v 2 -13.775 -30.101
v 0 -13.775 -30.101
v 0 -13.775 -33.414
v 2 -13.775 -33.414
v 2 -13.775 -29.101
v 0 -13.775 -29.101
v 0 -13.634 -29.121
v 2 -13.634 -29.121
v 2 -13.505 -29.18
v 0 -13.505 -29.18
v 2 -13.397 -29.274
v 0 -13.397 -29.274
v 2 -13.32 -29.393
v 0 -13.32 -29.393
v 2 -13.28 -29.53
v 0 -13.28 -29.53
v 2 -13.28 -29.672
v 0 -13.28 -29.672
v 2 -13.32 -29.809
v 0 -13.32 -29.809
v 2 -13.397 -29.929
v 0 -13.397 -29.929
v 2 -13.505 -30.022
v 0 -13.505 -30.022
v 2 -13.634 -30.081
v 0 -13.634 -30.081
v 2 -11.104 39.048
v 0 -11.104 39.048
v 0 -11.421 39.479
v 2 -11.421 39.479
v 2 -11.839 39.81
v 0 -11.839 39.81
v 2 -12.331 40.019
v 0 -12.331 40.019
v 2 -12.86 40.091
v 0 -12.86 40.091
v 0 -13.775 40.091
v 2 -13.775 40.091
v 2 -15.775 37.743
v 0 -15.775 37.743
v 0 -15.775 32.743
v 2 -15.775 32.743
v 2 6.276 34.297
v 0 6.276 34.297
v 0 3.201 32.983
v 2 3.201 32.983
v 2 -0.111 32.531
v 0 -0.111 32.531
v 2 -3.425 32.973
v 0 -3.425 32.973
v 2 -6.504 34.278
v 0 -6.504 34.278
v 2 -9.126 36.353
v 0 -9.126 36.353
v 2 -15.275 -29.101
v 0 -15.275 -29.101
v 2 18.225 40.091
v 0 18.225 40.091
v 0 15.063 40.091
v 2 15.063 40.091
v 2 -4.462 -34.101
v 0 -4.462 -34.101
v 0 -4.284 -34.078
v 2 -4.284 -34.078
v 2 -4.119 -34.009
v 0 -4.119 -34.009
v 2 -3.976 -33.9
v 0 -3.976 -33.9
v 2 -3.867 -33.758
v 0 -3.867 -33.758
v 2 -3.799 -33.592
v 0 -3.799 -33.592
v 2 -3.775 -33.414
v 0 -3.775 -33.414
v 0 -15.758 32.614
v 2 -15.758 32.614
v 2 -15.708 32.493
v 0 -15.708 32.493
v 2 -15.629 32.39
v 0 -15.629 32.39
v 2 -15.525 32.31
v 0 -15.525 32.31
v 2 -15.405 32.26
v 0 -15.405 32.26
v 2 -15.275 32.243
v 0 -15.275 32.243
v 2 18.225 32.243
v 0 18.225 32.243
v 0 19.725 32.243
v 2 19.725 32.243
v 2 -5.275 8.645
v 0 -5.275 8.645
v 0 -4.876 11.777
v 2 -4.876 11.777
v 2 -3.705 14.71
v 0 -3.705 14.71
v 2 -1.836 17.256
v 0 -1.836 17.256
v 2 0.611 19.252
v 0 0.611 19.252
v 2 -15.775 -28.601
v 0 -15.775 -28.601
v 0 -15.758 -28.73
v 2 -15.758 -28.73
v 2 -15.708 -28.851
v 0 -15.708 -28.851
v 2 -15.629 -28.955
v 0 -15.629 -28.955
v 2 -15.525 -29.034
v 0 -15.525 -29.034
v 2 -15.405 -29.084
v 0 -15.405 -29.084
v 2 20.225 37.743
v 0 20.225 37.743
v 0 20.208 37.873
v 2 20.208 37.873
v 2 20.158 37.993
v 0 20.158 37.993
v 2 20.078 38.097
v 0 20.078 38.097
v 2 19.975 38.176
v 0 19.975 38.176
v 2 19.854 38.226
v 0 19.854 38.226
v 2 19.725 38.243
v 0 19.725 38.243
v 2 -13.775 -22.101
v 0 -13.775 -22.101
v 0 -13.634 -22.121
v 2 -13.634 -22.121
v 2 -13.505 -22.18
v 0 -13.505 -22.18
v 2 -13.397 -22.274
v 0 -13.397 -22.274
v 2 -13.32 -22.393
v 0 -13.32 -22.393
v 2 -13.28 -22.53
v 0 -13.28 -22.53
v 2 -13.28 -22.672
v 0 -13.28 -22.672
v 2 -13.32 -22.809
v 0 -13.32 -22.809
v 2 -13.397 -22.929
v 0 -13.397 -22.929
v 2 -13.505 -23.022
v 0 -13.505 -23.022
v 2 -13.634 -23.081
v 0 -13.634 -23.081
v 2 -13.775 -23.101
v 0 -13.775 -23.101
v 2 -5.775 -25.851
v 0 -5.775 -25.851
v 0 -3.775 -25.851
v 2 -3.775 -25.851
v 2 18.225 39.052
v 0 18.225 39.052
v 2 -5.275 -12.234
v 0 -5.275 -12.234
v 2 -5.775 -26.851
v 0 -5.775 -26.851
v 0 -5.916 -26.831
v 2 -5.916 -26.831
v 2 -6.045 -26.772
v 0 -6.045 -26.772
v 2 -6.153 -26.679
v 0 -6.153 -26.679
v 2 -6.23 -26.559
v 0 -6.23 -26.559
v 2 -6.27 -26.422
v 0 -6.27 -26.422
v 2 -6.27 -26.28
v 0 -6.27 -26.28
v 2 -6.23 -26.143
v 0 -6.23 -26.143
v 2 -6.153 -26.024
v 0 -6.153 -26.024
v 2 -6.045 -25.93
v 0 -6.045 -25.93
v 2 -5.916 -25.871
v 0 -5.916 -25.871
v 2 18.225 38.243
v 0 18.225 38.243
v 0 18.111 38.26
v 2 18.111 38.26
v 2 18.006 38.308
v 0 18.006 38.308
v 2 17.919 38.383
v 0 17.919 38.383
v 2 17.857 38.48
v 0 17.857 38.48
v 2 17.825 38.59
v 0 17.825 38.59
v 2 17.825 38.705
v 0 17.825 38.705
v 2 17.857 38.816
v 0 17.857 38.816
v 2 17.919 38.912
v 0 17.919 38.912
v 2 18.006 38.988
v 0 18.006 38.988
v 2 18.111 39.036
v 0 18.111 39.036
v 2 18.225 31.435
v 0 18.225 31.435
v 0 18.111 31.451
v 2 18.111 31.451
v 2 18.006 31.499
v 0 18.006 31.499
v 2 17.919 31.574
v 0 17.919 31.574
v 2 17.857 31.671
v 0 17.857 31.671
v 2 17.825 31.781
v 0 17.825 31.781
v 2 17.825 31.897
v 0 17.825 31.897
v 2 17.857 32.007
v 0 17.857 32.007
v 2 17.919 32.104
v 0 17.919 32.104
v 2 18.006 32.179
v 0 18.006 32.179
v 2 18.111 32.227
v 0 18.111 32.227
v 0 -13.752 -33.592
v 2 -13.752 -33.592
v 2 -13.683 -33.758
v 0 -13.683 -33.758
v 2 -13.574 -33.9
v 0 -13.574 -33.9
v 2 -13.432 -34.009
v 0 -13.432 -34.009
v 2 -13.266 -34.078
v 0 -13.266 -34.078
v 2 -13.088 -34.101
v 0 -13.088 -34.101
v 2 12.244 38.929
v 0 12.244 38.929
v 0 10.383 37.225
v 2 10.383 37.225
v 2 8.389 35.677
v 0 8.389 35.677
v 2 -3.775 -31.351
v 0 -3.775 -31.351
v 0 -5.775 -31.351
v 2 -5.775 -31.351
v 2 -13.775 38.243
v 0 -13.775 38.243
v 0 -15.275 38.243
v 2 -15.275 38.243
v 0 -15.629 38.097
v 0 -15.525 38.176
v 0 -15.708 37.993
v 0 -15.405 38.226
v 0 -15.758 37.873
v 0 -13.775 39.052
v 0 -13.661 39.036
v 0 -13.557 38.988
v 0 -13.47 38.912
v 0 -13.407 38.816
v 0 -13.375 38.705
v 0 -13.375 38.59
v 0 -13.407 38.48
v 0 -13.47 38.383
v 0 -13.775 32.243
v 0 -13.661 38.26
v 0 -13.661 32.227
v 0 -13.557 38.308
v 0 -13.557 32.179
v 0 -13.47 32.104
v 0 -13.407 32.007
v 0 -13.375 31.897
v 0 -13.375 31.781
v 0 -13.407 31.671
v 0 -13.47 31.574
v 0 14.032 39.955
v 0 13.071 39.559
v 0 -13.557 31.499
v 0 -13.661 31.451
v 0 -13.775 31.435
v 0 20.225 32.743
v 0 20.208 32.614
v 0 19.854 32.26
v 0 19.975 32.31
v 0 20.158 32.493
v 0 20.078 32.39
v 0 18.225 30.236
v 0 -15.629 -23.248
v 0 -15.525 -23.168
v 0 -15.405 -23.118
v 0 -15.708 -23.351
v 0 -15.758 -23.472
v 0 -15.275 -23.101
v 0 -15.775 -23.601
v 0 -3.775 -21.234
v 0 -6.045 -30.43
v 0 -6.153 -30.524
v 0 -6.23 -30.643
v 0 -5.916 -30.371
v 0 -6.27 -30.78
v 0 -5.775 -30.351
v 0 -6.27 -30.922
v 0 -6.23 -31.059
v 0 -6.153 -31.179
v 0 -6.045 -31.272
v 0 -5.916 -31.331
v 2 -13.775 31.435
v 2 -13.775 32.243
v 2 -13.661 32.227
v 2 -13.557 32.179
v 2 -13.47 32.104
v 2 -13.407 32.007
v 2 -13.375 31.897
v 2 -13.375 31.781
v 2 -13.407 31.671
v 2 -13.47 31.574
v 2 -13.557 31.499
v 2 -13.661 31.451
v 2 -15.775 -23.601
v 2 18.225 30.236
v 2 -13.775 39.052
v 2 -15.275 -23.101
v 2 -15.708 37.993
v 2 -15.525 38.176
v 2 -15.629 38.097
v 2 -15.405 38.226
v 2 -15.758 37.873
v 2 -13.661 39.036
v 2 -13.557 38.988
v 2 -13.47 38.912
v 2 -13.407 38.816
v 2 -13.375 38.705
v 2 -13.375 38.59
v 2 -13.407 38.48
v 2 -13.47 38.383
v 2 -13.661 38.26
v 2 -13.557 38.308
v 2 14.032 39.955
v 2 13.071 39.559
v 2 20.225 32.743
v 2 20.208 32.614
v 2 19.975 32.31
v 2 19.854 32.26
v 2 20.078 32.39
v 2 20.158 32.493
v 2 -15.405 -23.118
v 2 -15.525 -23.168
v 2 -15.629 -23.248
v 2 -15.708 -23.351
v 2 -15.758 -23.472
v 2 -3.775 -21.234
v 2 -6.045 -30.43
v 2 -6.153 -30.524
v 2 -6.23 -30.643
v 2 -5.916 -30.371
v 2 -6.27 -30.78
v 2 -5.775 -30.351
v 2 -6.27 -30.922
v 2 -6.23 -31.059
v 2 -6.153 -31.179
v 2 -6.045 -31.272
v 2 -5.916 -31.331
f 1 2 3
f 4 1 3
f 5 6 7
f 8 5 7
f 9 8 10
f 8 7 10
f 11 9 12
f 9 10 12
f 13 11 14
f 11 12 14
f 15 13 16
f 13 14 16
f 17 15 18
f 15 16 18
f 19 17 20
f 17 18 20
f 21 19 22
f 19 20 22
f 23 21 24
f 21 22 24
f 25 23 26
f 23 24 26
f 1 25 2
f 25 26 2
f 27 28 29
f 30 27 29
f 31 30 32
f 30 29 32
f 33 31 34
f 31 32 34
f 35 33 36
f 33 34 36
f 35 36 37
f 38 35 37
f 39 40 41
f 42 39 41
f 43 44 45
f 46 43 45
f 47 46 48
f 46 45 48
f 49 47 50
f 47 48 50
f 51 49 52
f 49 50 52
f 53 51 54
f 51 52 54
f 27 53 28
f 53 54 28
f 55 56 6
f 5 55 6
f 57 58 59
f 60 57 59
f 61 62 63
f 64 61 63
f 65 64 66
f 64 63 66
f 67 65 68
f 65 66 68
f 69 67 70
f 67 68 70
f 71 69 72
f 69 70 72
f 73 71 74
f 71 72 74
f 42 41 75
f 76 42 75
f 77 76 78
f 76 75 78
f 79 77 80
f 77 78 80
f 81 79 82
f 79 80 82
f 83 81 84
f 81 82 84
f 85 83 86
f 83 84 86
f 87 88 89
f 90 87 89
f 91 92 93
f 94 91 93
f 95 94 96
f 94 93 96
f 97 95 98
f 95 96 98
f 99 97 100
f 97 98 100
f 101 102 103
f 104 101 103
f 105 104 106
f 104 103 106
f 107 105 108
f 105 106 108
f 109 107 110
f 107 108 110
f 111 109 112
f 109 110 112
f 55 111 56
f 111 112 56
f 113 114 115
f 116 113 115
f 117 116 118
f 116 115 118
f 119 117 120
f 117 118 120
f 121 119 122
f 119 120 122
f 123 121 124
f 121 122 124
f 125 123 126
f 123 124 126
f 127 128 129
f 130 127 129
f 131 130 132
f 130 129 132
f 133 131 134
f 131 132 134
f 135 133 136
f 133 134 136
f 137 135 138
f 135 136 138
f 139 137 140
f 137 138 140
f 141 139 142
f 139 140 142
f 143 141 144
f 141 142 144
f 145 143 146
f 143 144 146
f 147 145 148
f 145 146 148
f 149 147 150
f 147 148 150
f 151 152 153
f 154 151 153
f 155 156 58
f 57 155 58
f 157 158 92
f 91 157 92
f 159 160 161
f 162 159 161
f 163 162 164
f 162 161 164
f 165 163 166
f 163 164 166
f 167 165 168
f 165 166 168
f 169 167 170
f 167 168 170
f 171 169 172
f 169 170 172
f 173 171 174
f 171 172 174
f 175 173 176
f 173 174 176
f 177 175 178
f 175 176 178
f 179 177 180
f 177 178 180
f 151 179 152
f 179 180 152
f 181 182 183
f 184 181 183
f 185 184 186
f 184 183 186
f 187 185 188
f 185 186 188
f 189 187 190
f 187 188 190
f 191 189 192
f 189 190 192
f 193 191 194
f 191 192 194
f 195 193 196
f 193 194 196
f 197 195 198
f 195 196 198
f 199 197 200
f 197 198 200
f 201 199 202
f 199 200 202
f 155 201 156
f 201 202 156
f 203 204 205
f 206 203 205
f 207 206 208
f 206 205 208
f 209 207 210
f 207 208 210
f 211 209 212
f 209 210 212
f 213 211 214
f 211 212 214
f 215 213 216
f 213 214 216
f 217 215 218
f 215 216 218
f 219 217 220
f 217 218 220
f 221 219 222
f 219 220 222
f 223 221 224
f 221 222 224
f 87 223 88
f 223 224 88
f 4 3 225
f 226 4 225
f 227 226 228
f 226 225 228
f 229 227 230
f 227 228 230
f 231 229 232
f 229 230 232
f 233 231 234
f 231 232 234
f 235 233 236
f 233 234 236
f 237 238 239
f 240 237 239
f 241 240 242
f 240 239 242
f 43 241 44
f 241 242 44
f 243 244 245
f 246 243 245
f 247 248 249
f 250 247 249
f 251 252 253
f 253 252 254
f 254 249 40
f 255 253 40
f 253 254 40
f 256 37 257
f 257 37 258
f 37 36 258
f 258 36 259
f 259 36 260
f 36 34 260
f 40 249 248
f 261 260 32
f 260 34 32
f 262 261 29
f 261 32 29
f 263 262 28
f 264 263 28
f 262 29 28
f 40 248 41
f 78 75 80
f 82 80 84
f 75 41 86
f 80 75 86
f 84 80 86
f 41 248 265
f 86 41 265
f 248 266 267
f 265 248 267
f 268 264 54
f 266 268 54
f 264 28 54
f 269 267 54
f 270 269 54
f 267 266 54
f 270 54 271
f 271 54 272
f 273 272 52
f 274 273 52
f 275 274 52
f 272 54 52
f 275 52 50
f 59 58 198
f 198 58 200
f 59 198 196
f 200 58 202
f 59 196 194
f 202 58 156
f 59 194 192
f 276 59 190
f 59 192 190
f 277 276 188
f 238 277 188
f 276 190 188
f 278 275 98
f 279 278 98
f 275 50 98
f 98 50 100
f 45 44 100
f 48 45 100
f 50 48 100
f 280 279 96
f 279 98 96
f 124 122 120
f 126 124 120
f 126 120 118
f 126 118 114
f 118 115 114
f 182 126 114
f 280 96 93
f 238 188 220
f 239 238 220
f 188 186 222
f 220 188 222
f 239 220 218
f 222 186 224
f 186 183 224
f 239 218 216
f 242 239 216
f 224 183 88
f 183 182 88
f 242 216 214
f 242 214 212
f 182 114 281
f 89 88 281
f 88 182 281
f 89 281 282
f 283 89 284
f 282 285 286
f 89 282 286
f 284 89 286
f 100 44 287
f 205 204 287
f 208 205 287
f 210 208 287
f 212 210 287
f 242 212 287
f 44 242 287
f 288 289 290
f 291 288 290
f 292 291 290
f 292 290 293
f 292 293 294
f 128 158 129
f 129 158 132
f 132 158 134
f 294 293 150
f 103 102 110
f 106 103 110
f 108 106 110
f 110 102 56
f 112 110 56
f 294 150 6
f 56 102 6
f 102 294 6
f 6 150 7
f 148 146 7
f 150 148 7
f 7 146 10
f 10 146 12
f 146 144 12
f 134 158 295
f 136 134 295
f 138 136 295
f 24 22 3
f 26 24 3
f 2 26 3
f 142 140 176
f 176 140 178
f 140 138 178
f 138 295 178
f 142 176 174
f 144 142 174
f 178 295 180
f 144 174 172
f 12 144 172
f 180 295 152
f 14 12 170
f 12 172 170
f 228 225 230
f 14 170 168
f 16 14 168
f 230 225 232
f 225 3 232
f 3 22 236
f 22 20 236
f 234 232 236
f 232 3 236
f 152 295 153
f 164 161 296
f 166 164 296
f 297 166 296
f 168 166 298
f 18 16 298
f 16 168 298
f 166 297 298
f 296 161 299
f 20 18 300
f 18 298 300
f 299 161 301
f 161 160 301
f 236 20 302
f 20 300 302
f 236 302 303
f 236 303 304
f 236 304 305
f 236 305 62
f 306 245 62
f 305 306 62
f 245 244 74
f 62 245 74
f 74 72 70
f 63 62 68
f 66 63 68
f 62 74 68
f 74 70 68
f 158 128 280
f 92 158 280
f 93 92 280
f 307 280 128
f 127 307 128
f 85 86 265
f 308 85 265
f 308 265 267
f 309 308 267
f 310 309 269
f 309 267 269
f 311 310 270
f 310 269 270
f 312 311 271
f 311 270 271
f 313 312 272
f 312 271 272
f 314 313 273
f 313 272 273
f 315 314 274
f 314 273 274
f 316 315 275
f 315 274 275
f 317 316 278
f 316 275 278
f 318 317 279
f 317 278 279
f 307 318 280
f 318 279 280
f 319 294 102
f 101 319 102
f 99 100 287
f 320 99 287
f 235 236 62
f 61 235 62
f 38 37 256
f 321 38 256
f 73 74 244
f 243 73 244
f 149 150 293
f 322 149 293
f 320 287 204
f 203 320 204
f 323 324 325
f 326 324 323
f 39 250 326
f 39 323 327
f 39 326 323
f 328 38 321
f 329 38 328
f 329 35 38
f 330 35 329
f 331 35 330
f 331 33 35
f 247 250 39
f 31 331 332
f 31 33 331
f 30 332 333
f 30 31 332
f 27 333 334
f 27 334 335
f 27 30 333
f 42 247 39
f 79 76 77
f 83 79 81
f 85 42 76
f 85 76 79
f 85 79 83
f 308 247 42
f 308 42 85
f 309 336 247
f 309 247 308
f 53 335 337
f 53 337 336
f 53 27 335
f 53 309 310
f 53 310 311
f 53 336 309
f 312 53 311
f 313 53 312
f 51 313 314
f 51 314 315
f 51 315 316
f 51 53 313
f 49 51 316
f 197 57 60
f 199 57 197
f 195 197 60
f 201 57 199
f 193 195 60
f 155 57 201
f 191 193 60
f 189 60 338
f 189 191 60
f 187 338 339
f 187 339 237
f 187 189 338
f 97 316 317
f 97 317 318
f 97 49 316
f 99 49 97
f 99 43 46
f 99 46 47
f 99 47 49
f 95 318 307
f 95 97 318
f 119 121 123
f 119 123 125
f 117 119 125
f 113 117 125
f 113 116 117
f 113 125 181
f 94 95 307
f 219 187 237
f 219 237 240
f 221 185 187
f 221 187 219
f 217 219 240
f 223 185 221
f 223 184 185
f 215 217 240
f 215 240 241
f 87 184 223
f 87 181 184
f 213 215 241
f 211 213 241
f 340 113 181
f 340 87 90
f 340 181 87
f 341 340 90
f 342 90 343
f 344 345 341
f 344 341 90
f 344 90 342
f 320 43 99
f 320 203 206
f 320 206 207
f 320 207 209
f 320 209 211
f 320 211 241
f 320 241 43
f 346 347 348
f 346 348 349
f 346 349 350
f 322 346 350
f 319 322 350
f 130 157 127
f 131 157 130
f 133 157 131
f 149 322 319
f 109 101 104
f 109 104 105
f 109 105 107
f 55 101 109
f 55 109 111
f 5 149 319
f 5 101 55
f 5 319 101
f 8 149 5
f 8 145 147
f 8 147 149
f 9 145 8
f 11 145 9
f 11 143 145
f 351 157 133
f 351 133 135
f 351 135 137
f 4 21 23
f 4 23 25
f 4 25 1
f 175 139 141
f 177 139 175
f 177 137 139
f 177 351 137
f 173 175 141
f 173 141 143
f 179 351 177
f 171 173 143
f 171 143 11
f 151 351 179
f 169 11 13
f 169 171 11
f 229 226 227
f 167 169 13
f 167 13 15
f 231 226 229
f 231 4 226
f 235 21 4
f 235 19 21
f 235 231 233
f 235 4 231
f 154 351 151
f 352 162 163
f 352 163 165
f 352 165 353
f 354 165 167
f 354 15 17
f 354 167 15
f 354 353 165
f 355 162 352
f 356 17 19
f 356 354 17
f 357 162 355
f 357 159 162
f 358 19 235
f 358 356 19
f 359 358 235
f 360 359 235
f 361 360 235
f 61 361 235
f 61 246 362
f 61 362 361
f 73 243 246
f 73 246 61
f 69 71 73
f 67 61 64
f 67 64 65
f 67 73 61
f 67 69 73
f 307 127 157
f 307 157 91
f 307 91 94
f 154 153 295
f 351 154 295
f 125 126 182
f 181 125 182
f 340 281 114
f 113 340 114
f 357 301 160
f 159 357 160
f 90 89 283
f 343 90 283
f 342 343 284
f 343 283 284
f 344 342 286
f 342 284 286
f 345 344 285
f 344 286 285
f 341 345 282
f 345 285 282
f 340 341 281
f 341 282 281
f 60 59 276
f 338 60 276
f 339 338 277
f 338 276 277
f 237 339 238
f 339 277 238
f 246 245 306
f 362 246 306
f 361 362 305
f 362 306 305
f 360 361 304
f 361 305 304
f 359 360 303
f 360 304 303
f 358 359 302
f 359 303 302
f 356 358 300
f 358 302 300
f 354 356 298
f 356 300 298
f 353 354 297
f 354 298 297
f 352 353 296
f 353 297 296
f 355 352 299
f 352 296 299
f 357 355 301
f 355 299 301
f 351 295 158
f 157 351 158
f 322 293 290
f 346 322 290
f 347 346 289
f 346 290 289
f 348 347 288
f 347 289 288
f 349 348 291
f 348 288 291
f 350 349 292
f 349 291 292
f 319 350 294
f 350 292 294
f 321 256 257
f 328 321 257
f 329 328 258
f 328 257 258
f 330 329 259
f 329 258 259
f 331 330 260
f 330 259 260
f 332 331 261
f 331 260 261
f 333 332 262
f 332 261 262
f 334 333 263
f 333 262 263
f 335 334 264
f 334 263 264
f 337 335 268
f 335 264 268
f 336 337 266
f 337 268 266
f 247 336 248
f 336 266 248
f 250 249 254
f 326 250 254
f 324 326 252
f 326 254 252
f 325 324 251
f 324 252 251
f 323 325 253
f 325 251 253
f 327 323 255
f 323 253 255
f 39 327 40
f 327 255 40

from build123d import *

# Parameters (mm, degrees)
BOSS_EXTRUDE1_DEPTH = 2


with BuildPart() as part:
    # Sketch4 → Boss-Extrude1 (new body)
    with BuildSketch(Plane(origin=(0, 0, 0), x_dir=(0, 0, -1), z_dir=(1, 0, 0))):
        with BuildLine():
            Line((34.101087746, -13.088045862), (34.101087746, -4.462231487))
            ThreePointArc((34.101087746, -4.462231487), (33.899842921, -3.9763835), (33.413994934, -3.775138674))
            Line((33.413994934, -3.775138674), (31.351087746, -3.775138674))
            Line((31.351087746, -3.775138674), (31.351087746, -5.775138674))
            ThreePointArc((31.351087746, -5.775138674), (30.851087746, -6.275138674), (30.351087746, -5.775138674))
            Line((30.351087746, -5.775138674), (26.851087746, -5.775138674))
            ThreePointArc((26.851087746, -5.775138674), (26.351087746, -6.275138674), (25.851087746, -5.775138674))
            Line((25.851087746, -5.775138674), (25.851087746, -3.775138674))
            Line((25.851087746, -3.775138674), (21.233669279, -3.775138674))
            Line((21.233669279, -3.775138674), (12.233669279, -5.275138674))
            Line((12.233669279, -5.275138674), (-8.644965801, -5.275138674))
            ThreePointArc((-8.644965801, -5.275138674), (-14.710069272, -3.705121285), (-19.251601877, 0.610538145))
            Line((-19.251601877, 0.610538145), (-30.235935202, 18.224861326))
            Line((-30.235935202, 18.224861326), (-31.434679787, 18.224861326))
            ThreePointArc((-31.434679787, 18.224861326), (-31.839000225, 17.820540888), (-32.243320663, 18.224861326))
            Line((-32.243320663, 18.224861326), (-32.243320663, 19.724861326))
            ThreePointArc((-32.243320663, 19.724861326), (-32.389767272, 20.078414716), (-32.743320663, 20.224861326))
            Line((-32.743320663, 20.224861326), (-37.743320663, 20.224861326))
            ThreePointArc((-37.743320663, 20.224861326), (-38.096874053, 20.078414716), (-38.243320663, 19.724861326))
            Line((-38.243320663, 19.724861326), (-38.243320663, 18.224861326))
            ThreePointArc((-38.243320663, 18.224861326), (-38.647641101, 17.820540888), (-39.051961539, 18.224861326))
            Line((-39.051961539, 18.224861326), (-40.090546725, 18.224861326))
            Line((-40.090546725, 18.224861326), (-40.090546725, 15.063013808))
            ThreePointArc((-40.090546725, 15.063013808), (-39.78872162, 13.538709885), (-38.928795501, 12.244442559))
            ThreePointArc((-38.928795501, 12.244442559), (-36.430620964, 9.401503447), (-34.296876278, 6.275753549))
            ThreePointArc((-34.296876278, 6.275753549), (-32.973480494, -3.425461249), (-39.047864509, -11.104445805))
            ThreePointArc((-39.047864509, -11.104445805), (-39.810232099, -11.839329581), (-40.090546725, -12.860447701))
            Line((-40.090546725, -12.860447701), (-40.090546725, -13.775138674))
            Line((-40.090546725, -13.775138674), (-39.051961539, -13.775138674))
            ThreePointArc((-39.051961539, -13.775138674), (-38.647641101, -13.370818236), (-38.243320663, -13.775138674))
            Line((-38.243320663, -13.775138674), (-38.243320663, -15.275138674))
            ThreePointArc((-38.243320663, -15.275138674), (-38.096874053, -15.628692065), (-37.743320663, -15.775138674))
            Line((-37.743320663, -15.775138674), (-32.743320663, -15.775138674))
            ThreePointArc((-32.743320663, -15.775138674), (-32.389767272, -15.628692065), (-32.243320663, -15.275138674))
            Line((-32.243320663, -15.275138674), (-32.243320663, -13.775138674))
            ThreePointArc((-32.243320663, -13.775138674), (-31.839000225, -13.370818236), (-31.434679787, -13.775138674))
            Line((-31.434679787, -13.775138674), (22.101087746, -13.775138674))
            ThreePointArc((22.101087746, -13.775138674), (22.601087746, -13.275138674), (23.101087746, -13.775138674))
            Line((23.101087746, -13.775138674), (23.101087746, -15.275138674))
            ThreePointArc((23.101087746, -15.275138674), (23.247534356, -15.628692065), (23.601087746, -15.775138674))
            Line((23.601087746, -15.775138674), (28.601087746, -15.775138674))
            ThreePointArc((28.601087746, -15.775138674), (28.954641137, -15.628692065), (29.101087746, -15.275138674))
            Line((29.101087746, -15.275138674), (29.101087746, -13.775138674))
            ThreePointArc((29.101087746, -13.775138674), (29.601087746, -13.275138674), (30.101087746, -13.775138674))
            Line((30.101087746, -13.775138674), (33.413994934, -13.775138674))
            ThreePointArc((33.413994934, -13.775138674), (33.899842921, -13.573893849), (34.101087746, -13.088045862))
        make_face()
    extrude(amount=BOSS_EXTRUDE1_DEPTH)


solid = part.part
